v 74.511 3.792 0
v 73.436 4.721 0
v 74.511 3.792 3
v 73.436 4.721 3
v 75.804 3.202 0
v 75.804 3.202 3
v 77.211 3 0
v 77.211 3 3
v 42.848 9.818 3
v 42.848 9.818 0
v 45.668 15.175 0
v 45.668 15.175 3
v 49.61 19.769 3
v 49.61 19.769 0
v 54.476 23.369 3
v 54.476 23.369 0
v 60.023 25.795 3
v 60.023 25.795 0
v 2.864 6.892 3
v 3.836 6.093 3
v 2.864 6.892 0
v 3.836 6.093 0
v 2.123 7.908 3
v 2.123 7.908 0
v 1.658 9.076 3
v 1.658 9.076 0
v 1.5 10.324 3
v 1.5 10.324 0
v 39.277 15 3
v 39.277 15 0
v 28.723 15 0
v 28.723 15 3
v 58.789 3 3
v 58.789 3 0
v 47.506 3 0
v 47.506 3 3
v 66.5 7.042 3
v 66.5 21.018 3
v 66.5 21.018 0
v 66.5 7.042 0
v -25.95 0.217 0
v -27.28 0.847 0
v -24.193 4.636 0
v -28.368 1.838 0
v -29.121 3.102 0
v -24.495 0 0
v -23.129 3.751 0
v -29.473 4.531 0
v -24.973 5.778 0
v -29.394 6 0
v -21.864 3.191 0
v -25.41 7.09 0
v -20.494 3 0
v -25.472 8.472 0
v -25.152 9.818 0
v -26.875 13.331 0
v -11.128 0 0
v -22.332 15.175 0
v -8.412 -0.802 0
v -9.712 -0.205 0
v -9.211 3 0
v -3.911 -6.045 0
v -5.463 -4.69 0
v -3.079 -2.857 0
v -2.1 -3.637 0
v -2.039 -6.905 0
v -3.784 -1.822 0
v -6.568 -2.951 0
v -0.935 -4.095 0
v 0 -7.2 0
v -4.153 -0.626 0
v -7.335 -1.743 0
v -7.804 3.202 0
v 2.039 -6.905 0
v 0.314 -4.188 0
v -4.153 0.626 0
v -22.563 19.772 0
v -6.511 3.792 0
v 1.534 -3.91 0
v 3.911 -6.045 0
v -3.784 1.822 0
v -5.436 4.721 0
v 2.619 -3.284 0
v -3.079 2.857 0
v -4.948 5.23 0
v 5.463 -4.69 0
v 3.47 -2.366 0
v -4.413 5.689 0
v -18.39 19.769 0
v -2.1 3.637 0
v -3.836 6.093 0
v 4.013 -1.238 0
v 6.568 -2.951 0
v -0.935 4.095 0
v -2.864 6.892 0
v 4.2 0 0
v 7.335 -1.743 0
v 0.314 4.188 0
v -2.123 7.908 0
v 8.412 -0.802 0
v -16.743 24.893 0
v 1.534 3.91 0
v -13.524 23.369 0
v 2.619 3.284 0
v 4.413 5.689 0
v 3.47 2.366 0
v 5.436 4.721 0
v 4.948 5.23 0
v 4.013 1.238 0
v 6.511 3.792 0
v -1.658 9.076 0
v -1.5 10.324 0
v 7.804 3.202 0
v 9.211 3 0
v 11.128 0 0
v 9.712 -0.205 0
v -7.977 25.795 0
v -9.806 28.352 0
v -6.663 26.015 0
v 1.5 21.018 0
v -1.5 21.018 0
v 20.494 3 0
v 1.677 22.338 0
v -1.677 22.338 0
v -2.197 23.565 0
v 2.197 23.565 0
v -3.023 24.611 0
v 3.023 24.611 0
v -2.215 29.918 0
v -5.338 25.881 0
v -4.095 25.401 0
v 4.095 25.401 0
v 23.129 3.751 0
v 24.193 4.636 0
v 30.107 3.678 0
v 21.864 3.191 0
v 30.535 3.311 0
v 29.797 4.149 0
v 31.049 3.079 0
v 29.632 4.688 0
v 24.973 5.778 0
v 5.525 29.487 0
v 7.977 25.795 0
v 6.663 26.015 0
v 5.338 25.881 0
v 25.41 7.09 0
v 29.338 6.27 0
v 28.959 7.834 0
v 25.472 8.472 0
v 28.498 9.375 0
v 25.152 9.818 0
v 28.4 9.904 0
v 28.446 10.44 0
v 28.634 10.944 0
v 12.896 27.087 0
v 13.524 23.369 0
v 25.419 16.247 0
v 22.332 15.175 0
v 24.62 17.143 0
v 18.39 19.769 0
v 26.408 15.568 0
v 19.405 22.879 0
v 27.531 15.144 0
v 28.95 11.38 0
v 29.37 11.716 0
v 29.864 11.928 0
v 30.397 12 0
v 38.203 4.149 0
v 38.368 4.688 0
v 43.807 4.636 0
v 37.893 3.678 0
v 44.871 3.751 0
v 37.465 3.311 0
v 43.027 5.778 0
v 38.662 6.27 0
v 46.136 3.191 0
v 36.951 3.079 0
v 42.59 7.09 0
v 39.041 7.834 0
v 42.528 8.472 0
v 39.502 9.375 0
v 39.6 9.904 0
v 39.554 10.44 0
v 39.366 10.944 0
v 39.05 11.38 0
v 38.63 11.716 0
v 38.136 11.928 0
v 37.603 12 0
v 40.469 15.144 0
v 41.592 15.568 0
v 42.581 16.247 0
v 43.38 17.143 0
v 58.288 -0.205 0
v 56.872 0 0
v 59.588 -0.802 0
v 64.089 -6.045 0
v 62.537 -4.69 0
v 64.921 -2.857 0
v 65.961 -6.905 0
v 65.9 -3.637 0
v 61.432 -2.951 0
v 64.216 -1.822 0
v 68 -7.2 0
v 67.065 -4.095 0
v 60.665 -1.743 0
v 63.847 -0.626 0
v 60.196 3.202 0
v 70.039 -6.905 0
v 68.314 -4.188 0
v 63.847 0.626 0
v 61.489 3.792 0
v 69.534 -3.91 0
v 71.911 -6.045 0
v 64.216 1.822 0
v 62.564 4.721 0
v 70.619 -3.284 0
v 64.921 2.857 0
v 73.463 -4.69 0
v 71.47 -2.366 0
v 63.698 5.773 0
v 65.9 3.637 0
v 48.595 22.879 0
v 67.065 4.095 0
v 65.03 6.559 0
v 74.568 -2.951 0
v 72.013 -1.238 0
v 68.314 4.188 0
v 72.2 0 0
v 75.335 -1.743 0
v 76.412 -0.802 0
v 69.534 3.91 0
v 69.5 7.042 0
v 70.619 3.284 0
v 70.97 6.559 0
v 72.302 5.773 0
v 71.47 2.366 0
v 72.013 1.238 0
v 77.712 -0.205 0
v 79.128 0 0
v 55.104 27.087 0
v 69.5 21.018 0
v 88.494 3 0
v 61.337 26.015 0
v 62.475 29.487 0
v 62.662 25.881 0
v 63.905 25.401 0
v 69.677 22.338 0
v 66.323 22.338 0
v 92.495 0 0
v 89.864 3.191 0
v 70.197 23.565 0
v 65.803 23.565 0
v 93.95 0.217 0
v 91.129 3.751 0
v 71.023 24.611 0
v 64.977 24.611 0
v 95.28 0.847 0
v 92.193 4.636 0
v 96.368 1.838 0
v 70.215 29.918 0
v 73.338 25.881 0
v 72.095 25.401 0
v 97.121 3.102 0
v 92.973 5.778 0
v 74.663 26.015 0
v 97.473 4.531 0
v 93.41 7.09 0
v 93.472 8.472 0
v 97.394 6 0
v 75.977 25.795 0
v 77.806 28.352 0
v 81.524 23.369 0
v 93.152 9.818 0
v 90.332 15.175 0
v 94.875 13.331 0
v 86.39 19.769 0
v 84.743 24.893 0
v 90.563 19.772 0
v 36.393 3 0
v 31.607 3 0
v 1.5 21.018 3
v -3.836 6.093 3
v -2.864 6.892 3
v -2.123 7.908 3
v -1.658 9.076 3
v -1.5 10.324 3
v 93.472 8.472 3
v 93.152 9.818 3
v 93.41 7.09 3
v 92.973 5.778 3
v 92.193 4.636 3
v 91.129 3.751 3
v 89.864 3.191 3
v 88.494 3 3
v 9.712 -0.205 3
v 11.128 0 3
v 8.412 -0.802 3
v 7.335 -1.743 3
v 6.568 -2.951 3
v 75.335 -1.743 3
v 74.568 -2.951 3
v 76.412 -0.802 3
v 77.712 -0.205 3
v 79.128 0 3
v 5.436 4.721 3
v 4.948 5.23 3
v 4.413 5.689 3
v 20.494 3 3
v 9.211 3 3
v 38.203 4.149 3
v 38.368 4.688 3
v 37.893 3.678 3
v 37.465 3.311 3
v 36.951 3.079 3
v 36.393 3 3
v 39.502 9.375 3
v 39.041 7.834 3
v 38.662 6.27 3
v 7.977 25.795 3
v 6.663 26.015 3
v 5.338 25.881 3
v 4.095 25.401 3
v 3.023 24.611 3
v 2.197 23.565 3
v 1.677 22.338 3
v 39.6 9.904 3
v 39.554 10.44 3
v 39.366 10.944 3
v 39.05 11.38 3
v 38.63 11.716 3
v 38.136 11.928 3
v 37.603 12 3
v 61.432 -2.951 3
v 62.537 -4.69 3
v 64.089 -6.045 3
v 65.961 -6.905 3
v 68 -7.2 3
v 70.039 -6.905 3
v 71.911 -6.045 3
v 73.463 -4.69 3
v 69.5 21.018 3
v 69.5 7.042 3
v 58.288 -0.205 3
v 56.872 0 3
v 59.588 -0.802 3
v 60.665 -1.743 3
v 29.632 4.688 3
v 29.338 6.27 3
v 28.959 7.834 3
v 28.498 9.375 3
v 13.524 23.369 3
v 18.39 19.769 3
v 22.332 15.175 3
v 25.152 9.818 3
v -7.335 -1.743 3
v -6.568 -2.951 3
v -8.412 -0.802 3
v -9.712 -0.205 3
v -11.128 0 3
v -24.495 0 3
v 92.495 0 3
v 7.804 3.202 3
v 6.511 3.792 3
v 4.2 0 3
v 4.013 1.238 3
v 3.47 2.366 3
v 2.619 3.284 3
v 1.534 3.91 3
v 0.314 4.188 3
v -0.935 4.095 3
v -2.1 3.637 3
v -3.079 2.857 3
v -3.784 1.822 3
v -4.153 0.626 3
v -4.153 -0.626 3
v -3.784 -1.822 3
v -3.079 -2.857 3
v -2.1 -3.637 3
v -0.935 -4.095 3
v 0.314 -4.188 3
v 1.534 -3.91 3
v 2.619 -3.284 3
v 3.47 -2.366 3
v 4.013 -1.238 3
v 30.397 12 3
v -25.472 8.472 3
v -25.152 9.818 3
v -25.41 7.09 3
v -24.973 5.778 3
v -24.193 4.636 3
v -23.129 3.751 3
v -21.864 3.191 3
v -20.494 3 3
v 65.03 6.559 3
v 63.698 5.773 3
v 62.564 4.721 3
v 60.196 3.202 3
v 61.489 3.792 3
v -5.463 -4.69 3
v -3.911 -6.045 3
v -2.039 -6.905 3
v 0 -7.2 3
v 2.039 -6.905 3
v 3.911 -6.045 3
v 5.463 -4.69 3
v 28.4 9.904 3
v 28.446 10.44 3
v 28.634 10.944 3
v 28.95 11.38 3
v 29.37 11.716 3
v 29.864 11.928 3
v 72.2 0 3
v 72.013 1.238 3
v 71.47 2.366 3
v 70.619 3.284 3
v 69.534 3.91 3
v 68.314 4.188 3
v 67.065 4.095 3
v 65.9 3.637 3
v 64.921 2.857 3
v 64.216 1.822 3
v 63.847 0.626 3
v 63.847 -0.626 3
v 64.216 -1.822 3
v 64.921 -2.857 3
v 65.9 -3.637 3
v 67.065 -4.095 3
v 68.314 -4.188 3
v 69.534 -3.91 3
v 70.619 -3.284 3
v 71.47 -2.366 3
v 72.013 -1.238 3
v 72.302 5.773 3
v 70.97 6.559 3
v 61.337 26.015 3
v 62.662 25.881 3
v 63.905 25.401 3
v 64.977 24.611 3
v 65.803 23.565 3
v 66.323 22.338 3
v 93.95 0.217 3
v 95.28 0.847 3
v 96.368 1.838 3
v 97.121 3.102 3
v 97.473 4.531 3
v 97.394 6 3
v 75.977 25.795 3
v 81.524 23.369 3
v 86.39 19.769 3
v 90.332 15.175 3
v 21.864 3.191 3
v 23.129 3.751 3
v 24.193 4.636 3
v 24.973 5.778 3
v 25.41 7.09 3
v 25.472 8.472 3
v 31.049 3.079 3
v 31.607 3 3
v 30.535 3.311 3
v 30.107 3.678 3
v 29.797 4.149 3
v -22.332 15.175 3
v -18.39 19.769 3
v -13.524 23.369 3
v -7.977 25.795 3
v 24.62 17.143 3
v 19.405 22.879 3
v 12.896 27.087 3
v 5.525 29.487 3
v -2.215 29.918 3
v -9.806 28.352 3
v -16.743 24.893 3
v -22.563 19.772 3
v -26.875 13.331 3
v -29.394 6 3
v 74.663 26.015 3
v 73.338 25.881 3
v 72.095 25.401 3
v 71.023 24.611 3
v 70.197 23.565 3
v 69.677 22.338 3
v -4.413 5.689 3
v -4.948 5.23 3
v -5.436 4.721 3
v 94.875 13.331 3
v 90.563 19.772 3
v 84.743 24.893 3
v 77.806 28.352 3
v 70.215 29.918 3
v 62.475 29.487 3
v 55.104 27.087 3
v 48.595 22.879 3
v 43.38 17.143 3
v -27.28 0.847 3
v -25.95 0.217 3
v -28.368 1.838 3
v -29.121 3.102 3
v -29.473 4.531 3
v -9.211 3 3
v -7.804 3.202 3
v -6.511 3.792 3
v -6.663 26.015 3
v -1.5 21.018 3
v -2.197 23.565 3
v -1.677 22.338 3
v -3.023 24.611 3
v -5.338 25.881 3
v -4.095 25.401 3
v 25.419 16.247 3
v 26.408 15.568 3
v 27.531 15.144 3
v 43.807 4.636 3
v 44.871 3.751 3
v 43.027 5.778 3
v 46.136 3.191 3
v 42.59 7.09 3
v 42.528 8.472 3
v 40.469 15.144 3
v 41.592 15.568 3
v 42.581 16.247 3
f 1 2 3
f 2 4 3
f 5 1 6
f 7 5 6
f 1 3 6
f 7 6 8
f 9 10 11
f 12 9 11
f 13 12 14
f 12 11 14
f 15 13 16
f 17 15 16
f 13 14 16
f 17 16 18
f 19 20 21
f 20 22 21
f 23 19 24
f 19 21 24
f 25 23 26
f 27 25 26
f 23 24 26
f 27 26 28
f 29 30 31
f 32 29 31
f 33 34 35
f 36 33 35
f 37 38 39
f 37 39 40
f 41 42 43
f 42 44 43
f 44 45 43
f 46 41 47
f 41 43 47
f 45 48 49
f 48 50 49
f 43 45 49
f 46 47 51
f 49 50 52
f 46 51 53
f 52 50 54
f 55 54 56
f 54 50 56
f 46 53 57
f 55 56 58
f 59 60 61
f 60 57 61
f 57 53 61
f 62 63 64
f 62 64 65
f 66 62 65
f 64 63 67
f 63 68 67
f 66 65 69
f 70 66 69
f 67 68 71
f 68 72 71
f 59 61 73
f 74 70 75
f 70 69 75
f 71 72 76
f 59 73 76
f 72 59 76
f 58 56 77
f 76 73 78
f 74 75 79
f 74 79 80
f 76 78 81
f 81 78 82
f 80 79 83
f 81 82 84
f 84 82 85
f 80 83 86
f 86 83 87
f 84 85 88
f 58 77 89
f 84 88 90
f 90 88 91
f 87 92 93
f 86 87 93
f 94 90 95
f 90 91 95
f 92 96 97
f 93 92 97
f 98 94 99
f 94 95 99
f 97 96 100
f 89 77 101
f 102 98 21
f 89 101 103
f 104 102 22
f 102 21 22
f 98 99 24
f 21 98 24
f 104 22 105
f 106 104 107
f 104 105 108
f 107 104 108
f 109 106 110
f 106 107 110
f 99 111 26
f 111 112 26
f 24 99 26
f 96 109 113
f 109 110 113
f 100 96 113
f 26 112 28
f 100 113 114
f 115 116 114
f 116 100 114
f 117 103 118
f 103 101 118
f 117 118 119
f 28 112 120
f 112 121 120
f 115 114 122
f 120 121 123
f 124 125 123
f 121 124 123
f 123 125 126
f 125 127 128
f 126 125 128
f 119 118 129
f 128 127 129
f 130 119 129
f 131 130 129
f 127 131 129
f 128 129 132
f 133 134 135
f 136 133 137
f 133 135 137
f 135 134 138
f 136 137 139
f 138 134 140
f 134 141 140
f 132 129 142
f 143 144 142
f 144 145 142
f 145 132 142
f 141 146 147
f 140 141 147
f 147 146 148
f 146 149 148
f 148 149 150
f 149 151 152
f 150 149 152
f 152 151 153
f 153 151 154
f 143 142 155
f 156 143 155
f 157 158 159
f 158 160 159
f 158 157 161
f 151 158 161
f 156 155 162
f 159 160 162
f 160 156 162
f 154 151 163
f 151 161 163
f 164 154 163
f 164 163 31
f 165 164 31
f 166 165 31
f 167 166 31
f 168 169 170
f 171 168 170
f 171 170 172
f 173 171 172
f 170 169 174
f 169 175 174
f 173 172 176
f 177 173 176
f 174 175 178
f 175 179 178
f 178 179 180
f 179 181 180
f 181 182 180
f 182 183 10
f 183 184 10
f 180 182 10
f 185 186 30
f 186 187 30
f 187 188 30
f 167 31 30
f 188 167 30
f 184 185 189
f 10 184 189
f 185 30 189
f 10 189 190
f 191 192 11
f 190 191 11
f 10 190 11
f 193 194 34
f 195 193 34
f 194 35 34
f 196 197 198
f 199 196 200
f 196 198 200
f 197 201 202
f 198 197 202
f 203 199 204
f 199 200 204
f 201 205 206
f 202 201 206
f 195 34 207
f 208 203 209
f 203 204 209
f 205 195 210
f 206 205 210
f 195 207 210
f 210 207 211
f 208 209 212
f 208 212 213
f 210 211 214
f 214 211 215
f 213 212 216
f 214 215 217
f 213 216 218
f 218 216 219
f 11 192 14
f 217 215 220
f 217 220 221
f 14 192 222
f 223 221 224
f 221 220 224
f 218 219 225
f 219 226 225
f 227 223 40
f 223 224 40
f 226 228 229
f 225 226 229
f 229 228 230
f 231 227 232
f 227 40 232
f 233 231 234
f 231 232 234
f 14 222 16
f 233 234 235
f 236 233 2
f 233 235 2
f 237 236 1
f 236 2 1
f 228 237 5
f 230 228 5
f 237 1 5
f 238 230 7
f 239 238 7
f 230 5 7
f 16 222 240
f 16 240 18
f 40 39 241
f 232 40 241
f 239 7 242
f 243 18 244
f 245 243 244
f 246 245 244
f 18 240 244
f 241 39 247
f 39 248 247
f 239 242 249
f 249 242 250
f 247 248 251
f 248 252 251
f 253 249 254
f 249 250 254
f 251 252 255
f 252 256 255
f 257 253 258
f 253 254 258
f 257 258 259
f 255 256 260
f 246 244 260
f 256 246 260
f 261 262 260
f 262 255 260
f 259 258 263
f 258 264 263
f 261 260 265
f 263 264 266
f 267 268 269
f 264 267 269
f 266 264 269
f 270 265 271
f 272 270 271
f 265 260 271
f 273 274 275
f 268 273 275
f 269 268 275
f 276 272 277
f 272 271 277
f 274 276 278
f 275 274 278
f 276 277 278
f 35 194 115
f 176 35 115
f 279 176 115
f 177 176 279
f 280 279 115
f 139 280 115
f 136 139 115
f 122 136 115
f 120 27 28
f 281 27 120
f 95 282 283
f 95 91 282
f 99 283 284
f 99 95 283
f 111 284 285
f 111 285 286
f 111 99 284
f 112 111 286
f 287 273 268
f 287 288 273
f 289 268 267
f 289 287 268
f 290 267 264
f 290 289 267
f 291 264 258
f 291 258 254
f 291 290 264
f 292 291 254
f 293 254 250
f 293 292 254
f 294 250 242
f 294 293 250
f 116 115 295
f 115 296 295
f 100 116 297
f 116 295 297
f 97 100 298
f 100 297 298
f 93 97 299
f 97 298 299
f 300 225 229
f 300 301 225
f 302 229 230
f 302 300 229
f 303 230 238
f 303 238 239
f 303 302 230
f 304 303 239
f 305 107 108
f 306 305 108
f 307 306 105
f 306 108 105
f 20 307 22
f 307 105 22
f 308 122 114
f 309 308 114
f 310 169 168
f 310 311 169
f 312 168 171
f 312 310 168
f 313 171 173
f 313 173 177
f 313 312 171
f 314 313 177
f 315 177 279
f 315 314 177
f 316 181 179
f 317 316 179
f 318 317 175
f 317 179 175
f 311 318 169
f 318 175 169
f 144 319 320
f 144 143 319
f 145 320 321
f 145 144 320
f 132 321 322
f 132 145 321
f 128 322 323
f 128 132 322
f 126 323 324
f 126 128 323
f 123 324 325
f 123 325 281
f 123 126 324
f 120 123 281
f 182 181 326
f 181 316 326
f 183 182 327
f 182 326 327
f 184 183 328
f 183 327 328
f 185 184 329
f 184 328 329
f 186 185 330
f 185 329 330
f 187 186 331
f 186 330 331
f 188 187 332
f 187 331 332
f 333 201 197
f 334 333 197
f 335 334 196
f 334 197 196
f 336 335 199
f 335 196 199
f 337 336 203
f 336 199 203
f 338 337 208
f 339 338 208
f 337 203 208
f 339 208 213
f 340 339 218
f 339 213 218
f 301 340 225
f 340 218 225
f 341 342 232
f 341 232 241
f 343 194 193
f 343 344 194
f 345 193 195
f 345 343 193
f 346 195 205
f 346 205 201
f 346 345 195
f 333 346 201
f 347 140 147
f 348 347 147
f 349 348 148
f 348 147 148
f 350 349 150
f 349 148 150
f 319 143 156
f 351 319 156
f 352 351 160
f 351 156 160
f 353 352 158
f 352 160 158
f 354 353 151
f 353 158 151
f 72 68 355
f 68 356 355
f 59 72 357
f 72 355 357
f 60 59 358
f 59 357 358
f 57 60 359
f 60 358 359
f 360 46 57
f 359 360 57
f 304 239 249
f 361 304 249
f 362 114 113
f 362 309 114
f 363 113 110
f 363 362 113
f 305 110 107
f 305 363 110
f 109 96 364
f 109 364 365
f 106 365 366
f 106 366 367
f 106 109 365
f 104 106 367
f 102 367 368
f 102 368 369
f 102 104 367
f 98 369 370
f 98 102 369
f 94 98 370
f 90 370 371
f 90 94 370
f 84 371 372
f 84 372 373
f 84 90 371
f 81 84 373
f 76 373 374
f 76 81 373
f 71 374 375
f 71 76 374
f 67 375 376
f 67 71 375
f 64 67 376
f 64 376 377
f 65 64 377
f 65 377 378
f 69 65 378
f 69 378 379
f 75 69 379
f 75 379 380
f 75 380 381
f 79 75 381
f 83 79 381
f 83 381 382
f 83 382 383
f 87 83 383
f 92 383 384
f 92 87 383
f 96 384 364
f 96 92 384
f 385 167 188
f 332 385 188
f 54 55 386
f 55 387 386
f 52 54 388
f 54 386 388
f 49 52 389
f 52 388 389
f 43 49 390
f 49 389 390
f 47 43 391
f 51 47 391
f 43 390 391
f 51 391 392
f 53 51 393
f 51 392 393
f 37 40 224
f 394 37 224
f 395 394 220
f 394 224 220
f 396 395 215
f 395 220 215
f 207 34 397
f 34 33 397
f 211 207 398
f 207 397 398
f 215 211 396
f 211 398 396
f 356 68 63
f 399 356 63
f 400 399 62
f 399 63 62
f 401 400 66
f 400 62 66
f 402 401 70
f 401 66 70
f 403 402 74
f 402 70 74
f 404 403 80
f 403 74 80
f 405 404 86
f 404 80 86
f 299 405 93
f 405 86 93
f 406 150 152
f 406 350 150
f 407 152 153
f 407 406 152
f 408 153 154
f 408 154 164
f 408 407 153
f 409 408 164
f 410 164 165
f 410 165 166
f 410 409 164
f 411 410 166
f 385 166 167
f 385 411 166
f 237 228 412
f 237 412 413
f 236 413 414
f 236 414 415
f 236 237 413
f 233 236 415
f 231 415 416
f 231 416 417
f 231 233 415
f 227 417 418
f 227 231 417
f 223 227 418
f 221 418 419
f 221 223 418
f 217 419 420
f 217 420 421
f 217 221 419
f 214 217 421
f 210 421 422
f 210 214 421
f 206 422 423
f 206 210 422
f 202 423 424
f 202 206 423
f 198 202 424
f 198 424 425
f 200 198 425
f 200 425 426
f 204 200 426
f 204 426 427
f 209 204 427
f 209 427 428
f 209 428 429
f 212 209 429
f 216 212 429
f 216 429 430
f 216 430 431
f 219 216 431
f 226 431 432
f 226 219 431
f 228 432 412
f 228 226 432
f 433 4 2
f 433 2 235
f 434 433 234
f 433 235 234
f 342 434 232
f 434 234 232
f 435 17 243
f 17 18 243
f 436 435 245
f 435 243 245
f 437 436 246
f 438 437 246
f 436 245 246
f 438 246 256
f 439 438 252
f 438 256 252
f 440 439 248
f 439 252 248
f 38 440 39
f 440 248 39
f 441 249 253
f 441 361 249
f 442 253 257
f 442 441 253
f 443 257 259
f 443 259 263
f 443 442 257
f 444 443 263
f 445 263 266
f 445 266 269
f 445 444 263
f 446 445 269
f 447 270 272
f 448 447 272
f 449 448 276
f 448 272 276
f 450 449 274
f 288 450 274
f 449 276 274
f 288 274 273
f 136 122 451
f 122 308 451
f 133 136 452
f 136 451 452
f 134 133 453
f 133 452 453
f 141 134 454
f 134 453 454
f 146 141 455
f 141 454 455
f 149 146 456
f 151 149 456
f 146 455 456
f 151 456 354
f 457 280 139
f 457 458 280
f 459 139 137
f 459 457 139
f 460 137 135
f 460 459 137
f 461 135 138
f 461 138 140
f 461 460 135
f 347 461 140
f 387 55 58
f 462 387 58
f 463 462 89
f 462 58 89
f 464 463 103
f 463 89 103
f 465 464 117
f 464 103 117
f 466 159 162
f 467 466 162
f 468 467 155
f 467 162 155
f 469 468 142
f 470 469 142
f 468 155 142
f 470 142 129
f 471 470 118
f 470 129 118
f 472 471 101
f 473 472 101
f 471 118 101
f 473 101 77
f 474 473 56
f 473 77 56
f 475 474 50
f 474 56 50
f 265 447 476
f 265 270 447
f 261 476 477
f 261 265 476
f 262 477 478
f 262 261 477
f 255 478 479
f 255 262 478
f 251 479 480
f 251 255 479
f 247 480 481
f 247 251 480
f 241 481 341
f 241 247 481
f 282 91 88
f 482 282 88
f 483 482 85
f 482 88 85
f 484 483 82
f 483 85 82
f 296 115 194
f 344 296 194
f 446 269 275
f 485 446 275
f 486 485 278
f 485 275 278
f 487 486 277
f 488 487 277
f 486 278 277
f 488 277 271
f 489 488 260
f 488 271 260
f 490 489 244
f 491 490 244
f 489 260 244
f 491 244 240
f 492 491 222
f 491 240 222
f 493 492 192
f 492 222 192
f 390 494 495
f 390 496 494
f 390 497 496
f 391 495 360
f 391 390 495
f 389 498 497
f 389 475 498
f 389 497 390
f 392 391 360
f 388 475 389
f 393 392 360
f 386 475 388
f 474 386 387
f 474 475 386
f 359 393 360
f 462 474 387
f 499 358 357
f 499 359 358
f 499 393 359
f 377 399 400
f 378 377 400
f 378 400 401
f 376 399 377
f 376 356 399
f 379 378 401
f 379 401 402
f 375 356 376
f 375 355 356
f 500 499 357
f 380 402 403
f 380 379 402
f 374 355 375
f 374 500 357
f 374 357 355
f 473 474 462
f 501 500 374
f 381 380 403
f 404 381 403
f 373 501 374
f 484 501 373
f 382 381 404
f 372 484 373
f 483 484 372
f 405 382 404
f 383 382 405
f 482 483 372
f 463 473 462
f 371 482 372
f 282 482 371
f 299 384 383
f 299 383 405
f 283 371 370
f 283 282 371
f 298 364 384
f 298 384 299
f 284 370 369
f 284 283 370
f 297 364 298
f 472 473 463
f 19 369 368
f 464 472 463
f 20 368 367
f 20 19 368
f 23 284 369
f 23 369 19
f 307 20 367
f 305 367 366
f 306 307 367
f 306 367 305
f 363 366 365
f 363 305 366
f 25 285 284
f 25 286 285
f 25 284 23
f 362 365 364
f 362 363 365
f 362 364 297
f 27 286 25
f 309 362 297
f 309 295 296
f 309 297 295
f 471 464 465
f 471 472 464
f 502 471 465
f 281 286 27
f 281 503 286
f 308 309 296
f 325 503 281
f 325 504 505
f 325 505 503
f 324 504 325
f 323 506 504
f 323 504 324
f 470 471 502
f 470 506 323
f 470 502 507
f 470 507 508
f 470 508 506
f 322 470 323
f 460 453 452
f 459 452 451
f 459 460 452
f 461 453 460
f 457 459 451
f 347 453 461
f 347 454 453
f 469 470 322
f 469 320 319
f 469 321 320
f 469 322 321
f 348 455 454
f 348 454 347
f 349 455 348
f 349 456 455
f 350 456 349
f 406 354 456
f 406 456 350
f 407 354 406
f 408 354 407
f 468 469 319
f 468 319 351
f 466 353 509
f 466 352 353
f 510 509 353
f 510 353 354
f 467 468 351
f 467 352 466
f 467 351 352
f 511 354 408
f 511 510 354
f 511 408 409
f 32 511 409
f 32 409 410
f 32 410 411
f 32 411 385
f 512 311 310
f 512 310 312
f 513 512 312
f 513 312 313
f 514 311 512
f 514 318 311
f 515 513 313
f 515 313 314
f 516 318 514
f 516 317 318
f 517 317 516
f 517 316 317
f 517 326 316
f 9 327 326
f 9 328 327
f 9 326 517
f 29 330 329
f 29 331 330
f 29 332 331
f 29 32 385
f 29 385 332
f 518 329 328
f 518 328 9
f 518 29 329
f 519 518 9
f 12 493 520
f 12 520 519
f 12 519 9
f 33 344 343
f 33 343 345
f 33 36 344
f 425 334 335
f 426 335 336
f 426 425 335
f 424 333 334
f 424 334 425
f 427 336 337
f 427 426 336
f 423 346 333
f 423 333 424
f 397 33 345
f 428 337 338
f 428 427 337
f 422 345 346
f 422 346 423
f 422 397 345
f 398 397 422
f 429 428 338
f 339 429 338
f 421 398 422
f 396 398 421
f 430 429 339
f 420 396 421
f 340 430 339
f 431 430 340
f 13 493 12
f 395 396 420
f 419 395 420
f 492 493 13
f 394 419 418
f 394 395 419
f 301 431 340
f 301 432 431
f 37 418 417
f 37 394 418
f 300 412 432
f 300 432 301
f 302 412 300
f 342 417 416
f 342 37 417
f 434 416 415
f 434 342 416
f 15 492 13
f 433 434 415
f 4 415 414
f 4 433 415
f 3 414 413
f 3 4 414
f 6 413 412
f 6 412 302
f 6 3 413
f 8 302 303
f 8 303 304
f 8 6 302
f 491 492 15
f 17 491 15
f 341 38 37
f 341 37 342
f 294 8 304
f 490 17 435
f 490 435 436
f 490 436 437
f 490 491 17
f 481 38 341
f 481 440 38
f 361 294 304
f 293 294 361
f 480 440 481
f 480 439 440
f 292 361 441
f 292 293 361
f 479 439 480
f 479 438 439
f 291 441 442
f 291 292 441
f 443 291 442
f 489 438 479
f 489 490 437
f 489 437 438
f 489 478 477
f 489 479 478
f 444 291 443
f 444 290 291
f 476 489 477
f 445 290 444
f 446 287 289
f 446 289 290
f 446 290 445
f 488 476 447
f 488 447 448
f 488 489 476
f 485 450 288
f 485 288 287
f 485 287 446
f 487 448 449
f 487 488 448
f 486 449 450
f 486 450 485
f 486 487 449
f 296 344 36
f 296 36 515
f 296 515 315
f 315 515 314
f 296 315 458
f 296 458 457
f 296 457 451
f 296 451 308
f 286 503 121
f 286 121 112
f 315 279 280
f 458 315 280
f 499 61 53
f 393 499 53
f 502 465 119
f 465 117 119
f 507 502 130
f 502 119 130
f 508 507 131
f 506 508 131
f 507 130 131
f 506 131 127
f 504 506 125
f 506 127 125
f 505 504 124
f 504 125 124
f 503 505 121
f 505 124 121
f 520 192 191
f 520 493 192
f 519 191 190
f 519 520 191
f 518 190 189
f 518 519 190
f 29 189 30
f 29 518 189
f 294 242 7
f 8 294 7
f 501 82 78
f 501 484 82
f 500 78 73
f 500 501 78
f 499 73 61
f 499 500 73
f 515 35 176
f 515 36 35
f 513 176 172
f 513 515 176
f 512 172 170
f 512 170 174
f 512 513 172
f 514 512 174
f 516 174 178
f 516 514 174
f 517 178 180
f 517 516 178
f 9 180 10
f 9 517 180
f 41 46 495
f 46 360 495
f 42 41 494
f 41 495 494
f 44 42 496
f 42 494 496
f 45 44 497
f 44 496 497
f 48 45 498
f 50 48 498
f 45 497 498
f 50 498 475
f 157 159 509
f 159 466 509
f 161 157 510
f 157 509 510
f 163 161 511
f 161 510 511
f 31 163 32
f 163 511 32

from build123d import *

# Parameters (mm, degrees)
F0_R     = 4.2
F1_DEPTH = 3
F3_DEPTH = 3
F4_R     = 5
F5_R     = 2


with BuildPart() as f1:
    # F0 (on Top) → F1 (new body)
    with BuildSketch(Plane.XY):
        with BuildLine():
            ThreePointArc((6.545227, 3), (7.034402, 1.535312), (7.2, 0))
            Line((7.2, 0), (30, 0))
            Line((30, 0), (38, 0))
            Line((38, 0), (60.8, 0))
            ThreePointArc((60.8, 0), (60.965598, 1.535312), (61.454773, 3))
            Line((61.454773, 3), (41.167184, 3))
            ThreePointArc((41.167184, 3), (68, 27), (94.832816, 3))
            Line((94.832816, 3), (74.545227, 3))
            ThreePointArc((74.545227, 3), (75.034402, 1.535312), (75.2, 0))
            Line((75.2, 0), (98, 0))
            ThreePointArc((98, 0), (75.764571, 28.977775), (42.019238, 15))
            Line((42.019238, 15), (25.980762, 15))
            ThreePointArc((25.980762, 15), (-7.764571, 28.977775), (-30, 0))
            Line((-30, 0), (-7.2, 0))
            ThreePointArc((-7.2, 0), (-7.034402, 1.535312), (-6.545227, 3))
            Line((-6.545227, 3), (-26.832816, 3))
            ThreePointArc((-26.832816, 3), (0, 27), (26.832816, 3))
            Line((26.832816, 3), (6.545227, 3))
        make_face()
        with BuildLine():
            Line((38.150377, 3), (29.849623, 3))
            ThreePointArc((29.849623, 3), (29.023516, 7.591807), (27.495454, 12))
            Line((27.495454, 12), (40.504546, 12))
            ThreePointArc((40.504546, 12), (38.976484, 7.591807), (38.150377, 3))
        make_face(mode=Mode.SUBTRACT)
        with BuildLine():
            ThreePointArc((-7.2, 0), (0, -7.2), (7.2, 0))
            ThreePointArc((7.2, 0), (7.034402, 1.535312), (6.545227, 3))
            ThreePointArc((6.545227, 3), (0, 7.2), (-6.545227, 3))
            ThreePointArc((-6.545227, 3), (-7.034402, 1.535312), (-7.2, 0))
        make_face()
        Circle(F0_R, mode=Mode.SUBTRACT)
        with BuildLine():
            ThreePointArc((61.454773, 3), (60.965598, 1.535312), (60.8, 0))
            ThreePointArc((60.8, 0), (68, -7.2), (75.2, 0))
            ThreePointArc((75.2, 0), (75.034402, 1.535312), (74.545227, 3))
            ThreePointArc((74.545227, 3), (68, 7.2), (61.454773, 3))
        make_face()
        with Locations((68, 0)):
            Circle(F0_R, mode=Mode.SUBTRACT)
    extrude(amount=F1_DEPTH)

    # F2 (on face) → F3 (join, through all)
    with BuildSketch(Plane.XY.offset(3)):
        with BuildLine():
            Line((1.5, 7.042017), (1.5, 26.958301))
            ThreePointArc((1.5, 26.958301), (0.75029, 26.989573), (0, 27))
            Line((0, 27), (0, 7.2))
            ThreePointArc((0, 7.2), (0.754148, 7.160395), (1.5, 7.042017))
        make_face()
        with BuildLine():
            Line((0, 7.2), (0, 27))
            ThreePointArc((0, 27), (-0.75029, 26.989573), (-1.5, 26.958301))
            Line((-1.5, 26.958301), (-1.5, 7.042017))
            ThreePointArc((-1.5, 7.042017), (-0.754148, 7.160395), (0, 7.2))
        make_face()
        with BuildLine():
            Line((68, 7.2), (68, 27))
            ThreePointArc((68, 27), (67.24971, 26.989573), (66.5, 26.958301))
            Line((66.5, 26.958301), (66.5, 7.042017))
            ThreePointArc((66.5, 7.042017), (67.245852, 7.160395), (68, 7.2))
        make_face()
        with BuildLine():
            Line((69.5, 7.042017), (69.5, 26.958301))
            ThreePointArc((69.5, 26.958301), (68.75029, 26.989573), (68, 27))
            Line((68, 27), (68, 7.2))
            ThreePointArc((68, 7.2), (68.754148, 7.160395), (69.5, 7.042017))
        make_face()
    extrude(amount=-F3_DEPTH)

    # F4
    f4_edges = [f1.edges().sort_by_distance(p)[0] for p in [
        (-26.832816, 3, 1.5),
        (26.832816, 3, 1.5),
        (94.832816, 3, 1.5),
        (41.167184, 3, 1.5),
        (-7.2, 0, 1.5),
        (7.2, 0, 1.5),
        (60.8, 0, 1.5),
        (75.2, 0, 1.5),
        (74.545227, 3, 1.5),
        (61.454773, 3, 1.5),
        (-6.545227, 3, 1.5),
        (6.545227, 3, 1.5),
        (25.980762, 15, 1.5),
        (42.019238, 15, 1.5),
        (98, 0, 1.5),
        (-30, 0, 1.5),
        (-1.5, 7.042017, 1.5),
        (1.5, 7.042017, 1.5),
        (1.5, 26.958301, 1.5),
        (-1.5, 26.958301, 1.5),
        (69.5, 26.958301, 1.5),
        (66.5, 26.958301, 1.5),
    ]]
    fillet(f4_edges, radius=F4_R)

    # F5
    f5_edges = [f1.edges().sort_by_distance(p)[0] for p in [
        (27.495454, 12, 1.5),
        (40.504546, 12, 1.5),
        (29.849623, 3, 1.5),
        (38.150377, 3, 1.5),
    ]]
    fillet(f5_edges, radius=F5_R)


solid = f1.part
